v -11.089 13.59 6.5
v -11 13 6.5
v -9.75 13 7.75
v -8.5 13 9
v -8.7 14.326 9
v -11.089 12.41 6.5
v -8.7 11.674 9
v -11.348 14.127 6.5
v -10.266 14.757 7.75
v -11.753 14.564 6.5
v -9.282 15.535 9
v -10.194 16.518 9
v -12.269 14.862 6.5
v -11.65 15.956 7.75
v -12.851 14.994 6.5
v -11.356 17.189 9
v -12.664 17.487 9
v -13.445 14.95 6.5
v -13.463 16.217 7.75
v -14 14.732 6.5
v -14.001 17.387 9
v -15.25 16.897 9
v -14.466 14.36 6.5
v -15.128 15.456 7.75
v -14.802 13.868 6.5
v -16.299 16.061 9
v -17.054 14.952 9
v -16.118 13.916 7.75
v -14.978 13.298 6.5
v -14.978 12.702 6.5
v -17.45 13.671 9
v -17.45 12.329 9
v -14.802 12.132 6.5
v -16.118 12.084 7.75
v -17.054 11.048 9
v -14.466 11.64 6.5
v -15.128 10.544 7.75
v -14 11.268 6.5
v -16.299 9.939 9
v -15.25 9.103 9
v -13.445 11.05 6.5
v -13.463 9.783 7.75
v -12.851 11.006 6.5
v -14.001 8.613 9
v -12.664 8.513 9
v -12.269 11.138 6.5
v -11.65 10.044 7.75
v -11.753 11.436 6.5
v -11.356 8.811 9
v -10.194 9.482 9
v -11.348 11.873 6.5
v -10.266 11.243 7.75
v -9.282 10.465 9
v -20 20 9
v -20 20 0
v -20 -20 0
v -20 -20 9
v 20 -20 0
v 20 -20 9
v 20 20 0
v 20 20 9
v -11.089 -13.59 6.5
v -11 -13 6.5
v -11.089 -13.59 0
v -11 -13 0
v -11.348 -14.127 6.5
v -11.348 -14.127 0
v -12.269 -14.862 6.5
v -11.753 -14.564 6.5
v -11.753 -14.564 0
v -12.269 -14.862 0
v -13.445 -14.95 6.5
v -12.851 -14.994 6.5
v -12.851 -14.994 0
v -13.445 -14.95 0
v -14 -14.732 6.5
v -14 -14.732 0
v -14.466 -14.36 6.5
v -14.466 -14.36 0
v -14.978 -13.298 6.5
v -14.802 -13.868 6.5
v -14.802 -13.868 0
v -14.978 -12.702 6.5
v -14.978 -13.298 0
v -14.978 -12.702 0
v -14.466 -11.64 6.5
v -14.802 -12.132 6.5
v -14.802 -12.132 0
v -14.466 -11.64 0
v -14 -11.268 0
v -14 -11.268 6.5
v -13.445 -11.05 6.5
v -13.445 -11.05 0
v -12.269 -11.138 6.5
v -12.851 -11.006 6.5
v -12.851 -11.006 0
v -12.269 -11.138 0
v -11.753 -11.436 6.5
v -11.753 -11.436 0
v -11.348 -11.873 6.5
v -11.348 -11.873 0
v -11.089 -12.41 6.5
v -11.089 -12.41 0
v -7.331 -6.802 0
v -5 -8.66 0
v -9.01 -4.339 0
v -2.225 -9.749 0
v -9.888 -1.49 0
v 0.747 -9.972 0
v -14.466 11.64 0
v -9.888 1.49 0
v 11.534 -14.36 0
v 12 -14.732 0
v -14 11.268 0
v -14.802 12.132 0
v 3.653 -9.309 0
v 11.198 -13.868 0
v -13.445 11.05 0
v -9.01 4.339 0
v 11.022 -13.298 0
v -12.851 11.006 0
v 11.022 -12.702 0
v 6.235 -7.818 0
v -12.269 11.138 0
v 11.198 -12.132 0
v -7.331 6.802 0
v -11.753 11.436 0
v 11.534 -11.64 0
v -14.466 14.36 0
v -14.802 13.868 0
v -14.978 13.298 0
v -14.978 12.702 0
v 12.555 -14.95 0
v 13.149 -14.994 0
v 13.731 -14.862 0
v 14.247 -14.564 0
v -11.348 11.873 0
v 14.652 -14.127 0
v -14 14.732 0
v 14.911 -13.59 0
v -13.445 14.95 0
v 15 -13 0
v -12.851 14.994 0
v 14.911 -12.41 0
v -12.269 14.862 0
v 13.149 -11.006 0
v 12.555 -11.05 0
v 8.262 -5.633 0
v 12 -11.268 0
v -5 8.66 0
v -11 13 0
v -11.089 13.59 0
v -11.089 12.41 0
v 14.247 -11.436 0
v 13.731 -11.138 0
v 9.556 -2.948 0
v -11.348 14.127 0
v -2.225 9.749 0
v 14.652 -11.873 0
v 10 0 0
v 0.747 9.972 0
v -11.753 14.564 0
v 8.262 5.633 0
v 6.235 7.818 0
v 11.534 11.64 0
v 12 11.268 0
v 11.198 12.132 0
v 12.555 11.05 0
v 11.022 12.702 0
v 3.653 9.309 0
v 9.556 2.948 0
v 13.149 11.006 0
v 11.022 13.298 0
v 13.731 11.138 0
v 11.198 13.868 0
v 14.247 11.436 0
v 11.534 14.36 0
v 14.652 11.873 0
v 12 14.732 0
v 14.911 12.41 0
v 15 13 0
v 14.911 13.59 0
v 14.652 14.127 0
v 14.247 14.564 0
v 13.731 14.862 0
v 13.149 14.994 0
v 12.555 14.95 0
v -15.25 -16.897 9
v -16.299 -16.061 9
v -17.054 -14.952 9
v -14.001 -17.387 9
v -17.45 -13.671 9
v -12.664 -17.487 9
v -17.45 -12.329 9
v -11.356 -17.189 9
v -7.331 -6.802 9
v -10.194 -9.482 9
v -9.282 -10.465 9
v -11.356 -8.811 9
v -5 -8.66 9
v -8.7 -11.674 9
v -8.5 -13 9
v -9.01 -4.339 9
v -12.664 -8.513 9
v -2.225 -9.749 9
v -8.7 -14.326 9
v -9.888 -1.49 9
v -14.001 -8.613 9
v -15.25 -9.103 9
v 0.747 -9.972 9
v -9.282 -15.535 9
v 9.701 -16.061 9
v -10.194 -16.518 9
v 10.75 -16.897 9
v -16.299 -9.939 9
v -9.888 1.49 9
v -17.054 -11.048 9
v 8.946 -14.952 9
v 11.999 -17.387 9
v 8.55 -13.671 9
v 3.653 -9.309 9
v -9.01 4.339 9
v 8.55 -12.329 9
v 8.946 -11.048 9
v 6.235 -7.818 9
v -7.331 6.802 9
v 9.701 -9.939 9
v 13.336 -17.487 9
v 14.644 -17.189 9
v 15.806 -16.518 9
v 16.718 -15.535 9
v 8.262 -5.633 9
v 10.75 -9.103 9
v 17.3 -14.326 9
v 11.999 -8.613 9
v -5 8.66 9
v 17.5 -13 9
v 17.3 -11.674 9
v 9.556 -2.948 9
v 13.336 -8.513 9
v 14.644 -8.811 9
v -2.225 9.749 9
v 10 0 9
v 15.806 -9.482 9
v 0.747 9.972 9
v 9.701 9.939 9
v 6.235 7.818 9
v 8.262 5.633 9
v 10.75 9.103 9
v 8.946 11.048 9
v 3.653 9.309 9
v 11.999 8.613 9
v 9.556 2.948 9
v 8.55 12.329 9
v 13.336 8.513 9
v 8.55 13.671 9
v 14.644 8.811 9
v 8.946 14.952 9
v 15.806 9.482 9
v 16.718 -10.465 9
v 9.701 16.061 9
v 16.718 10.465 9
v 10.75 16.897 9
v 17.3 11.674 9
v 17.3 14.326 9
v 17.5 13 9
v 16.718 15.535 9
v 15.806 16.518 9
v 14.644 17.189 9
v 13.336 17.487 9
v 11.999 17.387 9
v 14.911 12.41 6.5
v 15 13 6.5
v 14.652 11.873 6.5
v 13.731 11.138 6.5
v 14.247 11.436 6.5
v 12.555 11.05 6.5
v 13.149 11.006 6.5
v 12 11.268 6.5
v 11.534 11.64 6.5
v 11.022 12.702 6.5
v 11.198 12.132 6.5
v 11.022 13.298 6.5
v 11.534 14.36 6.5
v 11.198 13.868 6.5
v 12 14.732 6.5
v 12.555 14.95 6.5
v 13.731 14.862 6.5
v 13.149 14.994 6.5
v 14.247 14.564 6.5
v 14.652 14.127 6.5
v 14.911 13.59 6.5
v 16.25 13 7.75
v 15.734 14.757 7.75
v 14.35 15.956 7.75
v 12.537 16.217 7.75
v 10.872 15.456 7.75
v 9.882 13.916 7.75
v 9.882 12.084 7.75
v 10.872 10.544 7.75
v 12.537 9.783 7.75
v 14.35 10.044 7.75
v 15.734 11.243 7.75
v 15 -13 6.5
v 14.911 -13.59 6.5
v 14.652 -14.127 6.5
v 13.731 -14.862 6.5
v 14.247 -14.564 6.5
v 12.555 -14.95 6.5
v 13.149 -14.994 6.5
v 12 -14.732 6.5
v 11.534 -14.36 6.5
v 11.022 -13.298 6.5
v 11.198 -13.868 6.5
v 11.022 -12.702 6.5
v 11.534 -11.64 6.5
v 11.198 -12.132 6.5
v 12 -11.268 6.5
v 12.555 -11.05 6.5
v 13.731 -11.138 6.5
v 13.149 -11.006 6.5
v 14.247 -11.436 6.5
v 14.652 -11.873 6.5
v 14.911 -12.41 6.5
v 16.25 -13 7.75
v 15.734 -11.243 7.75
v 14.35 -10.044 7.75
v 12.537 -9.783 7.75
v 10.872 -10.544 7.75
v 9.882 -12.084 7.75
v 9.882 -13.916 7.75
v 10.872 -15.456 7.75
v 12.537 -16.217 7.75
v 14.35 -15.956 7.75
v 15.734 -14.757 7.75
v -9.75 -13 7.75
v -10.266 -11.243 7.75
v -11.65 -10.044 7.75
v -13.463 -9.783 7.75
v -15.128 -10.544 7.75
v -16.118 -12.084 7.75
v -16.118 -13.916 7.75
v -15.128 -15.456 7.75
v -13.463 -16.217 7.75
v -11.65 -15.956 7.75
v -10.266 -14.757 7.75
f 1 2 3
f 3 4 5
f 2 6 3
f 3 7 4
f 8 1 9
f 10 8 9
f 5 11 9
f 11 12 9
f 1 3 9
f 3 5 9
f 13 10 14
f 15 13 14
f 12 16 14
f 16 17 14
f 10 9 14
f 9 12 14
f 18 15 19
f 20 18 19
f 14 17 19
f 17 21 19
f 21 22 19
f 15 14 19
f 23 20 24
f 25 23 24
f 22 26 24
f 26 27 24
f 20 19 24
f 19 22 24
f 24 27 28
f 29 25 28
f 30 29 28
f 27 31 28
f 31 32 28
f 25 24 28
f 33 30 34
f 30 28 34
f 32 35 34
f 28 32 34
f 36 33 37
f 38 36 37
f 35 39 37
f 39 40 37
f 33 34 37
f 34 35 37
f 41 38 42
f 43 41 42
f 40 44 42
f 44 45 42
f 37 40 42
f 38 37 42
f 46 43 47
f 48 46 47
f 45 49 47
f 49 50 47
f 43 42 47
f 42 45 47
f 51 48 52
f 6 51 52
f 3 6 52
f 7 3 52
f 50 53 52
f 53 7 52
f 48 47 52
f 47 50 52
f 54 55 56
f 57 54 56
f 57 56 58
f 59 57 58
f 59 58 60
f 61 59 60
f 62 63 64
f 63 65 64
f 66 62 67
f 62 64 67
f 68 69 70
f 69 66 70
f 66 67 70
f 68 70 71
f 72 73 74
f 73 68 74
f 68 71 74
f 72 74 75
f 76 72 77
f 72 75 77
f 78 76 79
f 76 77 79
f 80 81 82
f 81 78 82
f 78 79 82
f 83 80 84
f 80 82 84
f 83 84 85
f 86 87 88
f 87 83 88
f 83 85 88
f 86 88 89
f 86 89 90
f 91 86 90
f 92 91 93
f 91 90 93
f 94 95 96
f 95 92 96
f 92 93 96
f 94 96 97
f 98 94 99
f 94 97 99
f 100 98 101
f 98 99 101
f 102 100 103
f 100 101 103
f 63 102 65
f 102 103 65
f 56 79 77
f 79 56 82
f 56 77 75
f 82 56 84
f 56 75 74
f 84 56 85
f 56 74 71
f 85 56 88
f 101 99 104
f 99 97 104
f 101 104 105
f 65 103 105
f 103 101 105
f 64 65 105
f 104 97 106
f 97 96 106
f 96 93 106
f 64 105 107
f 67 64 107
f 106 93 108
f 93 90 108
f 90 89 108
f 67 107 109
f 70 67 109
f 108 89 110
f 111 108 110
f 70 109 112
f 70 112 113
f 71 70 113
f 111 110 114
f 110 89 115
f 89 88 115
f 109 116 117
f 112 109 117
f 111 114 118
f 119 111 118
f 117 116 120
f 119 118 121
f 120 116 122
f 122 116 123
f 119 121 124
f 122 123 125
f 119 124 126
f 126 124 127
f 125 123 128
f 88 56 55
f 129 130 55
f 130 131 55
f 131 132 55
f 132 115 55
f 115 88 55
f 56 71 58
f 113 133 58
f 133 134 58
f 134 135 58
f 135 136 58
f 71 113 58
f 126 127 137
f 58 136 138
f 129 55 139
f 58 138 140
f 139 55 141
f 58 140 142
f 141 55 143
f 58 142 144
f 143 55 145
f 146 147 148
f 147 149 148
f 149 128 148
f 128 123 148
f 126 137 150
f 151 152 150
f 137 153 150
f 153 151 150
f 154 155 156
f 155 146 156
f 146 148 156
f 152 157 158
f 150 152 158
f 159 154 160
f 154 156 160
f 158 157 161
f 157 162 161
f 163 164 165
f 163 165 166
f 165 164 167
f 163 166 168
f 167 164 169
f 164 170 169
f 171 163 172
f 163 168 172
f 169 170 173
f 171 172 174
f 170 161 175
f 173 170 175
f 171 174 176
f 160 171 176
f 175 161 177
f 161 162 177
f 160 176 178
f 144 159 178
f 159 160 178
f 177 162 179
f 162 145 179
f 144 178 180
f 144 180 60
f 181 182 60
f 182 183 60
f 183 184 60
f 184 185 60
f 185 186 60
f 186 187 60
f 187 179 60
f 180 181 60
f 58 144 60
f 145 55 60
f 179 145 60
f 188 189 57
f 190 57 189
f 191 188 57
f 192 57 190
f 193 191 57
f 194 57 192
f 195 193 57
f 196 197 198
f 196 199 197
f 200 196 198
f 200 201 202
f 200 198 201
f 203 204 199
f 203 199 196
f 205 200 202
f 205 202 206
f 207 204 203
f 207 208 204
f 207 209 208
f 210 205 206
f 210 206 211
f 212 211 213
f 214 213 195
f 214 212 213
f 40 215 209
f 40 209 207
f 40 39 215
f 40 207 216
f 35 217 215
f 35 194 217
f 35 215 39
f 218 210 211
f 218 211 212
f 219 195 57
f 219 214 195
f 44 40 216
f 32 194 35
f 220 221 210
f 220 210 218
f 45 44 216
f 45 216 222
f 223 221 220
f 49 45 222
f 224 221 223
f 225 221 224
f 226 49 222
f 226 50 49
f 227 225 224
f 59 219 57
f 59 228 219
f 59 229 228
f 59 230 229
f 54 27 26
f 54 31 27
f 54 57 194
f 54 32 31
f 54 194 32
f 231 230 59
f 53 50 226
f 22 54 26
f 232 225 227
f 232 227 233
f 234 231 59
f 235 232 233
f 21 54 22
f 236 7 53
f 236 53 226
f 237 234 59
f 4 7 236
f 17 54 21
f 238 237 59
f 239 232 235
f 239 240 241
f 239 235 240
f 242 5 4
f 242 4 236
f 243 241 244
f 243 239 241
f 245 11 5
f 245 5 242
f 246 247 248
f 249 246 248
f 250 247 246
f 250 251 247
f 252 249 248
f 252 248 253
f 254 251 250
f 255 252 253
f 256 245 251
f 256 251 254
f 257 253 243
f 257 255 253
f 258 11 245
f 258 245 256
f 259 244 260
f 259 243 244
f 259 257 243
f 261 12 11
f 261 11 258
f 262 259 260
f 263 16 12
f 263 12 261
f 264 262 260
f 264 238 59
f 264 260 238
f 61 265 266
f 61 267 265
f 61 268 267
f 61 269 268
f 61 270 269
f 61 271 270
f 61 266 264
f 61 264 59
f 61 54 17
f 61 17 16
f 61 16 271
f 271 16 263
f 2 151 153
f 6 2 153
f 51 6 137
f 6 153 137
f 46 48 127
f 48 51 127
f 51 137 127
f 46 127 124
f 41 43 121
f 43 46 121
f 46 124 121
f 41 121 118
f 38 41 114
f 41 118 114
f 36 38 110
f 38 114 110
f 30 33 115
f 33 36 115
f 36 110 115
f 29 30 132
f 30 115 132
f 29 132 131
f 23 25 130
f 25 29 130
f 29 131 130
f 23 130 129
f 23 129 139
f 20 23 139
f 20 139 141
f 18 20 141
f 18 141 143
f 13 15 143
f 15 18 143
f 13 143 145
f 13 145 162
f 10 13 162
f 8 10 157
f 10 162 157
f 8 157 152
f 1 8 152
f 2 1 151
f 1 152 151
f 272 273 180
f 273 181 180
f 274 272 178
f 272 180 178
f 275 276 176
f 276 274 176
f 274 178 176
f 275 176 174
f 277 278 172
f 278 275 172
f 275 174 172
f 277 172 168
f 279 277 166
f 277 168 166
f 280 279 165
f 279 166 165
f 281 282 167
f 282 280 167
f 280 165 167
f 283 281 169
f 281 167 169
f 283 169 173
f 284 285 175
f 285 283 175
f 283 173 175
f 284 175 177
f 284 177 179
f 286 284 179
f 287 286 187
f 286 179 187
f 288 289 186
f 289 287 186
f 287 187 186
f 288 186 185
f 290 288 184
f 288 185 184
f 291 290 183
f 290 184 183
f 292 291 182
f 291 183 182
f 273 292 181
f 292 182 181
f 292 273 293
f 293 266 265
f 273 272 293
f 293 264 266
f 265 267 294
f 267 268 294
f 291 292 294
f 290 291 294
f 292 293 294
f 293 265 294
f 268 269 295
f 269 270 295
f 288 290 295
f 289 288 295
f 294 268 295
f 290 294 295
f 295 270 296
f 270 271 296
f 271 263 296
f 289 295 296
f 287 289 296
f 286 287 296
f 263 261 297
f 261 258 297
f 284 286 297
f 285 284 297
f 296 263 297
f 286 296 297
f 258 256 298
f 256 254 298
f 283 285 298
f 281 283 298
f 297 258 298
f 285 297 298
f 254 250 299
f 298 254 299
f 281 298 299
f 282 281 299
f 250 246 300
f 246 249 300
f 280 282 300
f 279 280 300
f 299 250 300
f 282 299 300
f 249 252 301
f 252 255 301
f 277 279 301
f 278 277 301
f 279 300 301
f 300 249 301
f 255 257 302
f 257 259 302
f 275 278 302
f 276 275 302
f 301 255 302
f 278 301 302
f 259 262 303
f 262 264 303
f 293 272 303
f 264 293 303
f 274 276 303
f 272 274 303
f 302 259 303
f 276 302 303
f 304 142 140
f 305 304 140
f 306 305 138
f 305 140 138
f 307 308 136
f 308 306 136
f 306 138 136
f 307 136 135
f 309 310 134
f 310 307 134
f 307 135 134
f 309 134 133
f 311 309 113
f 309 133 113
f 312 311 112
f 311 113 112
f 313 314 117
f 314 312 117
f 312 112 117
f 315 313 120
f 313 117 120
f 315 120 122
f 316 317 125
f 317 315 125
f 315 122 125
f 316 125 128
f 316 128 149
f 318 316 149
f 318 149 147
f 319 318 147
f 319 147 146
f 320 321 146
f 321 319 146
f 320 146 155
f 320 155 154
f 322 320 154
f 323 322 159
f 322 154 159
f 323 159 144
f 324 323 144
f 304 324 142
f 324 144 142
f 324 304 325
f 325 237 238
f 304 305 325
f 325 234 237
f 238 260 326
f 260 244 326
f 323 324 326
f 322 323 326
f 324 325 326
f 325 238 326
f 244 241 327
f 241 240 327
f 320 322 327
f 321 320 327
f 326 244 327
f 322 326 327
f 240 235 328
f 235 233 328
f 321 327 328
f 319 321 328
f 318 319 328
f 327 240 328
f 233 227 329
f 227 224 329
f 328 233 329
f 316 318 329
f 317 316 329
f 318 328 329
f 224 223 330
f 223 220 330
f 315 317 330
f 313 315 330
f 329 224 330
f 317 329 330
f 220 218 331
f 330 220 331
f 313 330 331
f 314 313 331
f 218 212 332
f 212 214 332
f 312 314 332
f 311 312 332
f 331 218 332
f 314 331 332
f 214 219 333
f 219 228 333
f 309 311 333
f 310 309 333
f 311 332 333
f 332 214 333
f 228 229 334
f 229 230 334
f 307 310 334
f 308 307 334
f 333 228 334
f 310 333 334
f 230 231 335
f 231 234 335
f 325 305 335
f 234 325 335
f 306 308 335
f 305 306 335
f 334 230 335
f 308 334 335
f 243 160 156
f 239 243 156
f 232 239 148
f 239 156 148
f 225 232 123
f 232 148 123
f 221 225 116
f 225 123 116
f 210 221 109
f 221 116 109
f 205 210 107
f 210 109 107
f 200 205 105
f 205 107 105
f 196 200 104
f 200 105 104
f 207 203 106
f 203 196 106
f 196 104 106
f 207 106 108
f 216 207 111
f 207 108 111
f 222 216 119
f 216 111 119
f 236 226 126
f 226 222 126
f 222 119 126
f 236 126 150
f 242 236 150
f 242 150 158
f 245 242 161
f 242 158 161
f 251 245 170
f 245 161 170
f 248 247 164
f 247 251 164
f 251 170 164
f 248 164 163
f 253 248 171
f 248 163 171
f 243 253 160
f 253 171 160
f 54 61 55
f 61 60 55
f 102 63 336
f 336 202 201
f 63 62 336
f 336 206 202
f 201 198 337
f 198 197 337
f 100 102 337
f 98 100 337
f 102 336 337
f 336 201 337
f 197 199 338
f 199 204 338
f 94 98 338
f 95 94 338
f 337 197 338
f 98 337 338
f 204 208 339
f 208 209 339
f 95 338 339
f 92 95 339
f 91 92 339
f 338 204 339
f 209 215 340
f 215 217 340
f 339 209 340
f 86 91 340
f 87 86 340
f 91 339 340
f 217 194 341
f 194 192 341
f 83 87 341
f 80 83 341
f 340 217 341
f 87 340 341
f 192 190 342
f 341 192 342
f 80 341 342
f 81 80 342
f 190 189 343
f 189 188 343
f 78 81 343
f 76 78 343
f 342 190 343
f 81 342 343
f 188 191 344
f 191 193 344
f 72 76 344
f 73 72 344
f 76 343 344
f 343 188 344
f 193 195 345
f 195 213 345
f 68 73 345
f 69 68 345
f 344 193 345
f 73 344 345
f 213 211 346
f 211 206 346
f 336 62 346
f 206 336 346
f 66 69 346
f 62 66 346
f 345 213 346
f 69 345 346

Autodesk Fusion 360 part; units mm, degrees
sketch "Sketch1" plane through (0, 0, 0) normal (0, 0, 1) x (1, 0, 0)
  line L0 (20, 20) -> (-20, 20)
  line L1 (-20, 20) -> (-20, -20)
  line L2 (-20, -20) -> (20, -20)
  line L3 (20, -20) -> (20, 20)
  line L4 (20, 20) -> (-20, -20) construction
  line L5 (-20, 20) -> (20, -20) construction
  circle A0 centre (0, 0) radius 10
  line L6 (13, -13) -> (-13, -13) construction
  line L7 (-13, -13) -> (-13, 13) construction
  line L8 (-13, 13) -> (13, 13) construction
  line L9 (13, 13) -> (13, -13) construction
  line L10 (13, -13) -> (-13, 13) construction
  line L11 (-13, -13) -> (13, 13) construction
  circle A1 centre (-13, 13) radius 2
  circle A2 centre (13, 13) radius 2
  circle A3 centre (13, -13) radius 2
  circle A4 centre (-13, -13) radius 2
  dimension "d1" = 40
  dimension "d2" = 40
  dimension "d3" = 20
  dimension "d6" = 26
  dimension "d7" = 26
  dimension "d8" = 4
  dimension "d9" = 4
  dimension "d10" = 4
  dimension "d11" = 4
extrude "Extrude1" add sketch "Sketch1" along normal blind 9
chamfer "Chamfer1" distance 2.5 angle 45 4 edges at (-14.8647, 13.7232, 9) (-14.8647, -12.2768, 9) (11.1353, -12.2768, 9) (11.1353, 13.7232, 9)
equation "d9 = d8"
equation "d10 = d8"
equation "d11 = d8"
